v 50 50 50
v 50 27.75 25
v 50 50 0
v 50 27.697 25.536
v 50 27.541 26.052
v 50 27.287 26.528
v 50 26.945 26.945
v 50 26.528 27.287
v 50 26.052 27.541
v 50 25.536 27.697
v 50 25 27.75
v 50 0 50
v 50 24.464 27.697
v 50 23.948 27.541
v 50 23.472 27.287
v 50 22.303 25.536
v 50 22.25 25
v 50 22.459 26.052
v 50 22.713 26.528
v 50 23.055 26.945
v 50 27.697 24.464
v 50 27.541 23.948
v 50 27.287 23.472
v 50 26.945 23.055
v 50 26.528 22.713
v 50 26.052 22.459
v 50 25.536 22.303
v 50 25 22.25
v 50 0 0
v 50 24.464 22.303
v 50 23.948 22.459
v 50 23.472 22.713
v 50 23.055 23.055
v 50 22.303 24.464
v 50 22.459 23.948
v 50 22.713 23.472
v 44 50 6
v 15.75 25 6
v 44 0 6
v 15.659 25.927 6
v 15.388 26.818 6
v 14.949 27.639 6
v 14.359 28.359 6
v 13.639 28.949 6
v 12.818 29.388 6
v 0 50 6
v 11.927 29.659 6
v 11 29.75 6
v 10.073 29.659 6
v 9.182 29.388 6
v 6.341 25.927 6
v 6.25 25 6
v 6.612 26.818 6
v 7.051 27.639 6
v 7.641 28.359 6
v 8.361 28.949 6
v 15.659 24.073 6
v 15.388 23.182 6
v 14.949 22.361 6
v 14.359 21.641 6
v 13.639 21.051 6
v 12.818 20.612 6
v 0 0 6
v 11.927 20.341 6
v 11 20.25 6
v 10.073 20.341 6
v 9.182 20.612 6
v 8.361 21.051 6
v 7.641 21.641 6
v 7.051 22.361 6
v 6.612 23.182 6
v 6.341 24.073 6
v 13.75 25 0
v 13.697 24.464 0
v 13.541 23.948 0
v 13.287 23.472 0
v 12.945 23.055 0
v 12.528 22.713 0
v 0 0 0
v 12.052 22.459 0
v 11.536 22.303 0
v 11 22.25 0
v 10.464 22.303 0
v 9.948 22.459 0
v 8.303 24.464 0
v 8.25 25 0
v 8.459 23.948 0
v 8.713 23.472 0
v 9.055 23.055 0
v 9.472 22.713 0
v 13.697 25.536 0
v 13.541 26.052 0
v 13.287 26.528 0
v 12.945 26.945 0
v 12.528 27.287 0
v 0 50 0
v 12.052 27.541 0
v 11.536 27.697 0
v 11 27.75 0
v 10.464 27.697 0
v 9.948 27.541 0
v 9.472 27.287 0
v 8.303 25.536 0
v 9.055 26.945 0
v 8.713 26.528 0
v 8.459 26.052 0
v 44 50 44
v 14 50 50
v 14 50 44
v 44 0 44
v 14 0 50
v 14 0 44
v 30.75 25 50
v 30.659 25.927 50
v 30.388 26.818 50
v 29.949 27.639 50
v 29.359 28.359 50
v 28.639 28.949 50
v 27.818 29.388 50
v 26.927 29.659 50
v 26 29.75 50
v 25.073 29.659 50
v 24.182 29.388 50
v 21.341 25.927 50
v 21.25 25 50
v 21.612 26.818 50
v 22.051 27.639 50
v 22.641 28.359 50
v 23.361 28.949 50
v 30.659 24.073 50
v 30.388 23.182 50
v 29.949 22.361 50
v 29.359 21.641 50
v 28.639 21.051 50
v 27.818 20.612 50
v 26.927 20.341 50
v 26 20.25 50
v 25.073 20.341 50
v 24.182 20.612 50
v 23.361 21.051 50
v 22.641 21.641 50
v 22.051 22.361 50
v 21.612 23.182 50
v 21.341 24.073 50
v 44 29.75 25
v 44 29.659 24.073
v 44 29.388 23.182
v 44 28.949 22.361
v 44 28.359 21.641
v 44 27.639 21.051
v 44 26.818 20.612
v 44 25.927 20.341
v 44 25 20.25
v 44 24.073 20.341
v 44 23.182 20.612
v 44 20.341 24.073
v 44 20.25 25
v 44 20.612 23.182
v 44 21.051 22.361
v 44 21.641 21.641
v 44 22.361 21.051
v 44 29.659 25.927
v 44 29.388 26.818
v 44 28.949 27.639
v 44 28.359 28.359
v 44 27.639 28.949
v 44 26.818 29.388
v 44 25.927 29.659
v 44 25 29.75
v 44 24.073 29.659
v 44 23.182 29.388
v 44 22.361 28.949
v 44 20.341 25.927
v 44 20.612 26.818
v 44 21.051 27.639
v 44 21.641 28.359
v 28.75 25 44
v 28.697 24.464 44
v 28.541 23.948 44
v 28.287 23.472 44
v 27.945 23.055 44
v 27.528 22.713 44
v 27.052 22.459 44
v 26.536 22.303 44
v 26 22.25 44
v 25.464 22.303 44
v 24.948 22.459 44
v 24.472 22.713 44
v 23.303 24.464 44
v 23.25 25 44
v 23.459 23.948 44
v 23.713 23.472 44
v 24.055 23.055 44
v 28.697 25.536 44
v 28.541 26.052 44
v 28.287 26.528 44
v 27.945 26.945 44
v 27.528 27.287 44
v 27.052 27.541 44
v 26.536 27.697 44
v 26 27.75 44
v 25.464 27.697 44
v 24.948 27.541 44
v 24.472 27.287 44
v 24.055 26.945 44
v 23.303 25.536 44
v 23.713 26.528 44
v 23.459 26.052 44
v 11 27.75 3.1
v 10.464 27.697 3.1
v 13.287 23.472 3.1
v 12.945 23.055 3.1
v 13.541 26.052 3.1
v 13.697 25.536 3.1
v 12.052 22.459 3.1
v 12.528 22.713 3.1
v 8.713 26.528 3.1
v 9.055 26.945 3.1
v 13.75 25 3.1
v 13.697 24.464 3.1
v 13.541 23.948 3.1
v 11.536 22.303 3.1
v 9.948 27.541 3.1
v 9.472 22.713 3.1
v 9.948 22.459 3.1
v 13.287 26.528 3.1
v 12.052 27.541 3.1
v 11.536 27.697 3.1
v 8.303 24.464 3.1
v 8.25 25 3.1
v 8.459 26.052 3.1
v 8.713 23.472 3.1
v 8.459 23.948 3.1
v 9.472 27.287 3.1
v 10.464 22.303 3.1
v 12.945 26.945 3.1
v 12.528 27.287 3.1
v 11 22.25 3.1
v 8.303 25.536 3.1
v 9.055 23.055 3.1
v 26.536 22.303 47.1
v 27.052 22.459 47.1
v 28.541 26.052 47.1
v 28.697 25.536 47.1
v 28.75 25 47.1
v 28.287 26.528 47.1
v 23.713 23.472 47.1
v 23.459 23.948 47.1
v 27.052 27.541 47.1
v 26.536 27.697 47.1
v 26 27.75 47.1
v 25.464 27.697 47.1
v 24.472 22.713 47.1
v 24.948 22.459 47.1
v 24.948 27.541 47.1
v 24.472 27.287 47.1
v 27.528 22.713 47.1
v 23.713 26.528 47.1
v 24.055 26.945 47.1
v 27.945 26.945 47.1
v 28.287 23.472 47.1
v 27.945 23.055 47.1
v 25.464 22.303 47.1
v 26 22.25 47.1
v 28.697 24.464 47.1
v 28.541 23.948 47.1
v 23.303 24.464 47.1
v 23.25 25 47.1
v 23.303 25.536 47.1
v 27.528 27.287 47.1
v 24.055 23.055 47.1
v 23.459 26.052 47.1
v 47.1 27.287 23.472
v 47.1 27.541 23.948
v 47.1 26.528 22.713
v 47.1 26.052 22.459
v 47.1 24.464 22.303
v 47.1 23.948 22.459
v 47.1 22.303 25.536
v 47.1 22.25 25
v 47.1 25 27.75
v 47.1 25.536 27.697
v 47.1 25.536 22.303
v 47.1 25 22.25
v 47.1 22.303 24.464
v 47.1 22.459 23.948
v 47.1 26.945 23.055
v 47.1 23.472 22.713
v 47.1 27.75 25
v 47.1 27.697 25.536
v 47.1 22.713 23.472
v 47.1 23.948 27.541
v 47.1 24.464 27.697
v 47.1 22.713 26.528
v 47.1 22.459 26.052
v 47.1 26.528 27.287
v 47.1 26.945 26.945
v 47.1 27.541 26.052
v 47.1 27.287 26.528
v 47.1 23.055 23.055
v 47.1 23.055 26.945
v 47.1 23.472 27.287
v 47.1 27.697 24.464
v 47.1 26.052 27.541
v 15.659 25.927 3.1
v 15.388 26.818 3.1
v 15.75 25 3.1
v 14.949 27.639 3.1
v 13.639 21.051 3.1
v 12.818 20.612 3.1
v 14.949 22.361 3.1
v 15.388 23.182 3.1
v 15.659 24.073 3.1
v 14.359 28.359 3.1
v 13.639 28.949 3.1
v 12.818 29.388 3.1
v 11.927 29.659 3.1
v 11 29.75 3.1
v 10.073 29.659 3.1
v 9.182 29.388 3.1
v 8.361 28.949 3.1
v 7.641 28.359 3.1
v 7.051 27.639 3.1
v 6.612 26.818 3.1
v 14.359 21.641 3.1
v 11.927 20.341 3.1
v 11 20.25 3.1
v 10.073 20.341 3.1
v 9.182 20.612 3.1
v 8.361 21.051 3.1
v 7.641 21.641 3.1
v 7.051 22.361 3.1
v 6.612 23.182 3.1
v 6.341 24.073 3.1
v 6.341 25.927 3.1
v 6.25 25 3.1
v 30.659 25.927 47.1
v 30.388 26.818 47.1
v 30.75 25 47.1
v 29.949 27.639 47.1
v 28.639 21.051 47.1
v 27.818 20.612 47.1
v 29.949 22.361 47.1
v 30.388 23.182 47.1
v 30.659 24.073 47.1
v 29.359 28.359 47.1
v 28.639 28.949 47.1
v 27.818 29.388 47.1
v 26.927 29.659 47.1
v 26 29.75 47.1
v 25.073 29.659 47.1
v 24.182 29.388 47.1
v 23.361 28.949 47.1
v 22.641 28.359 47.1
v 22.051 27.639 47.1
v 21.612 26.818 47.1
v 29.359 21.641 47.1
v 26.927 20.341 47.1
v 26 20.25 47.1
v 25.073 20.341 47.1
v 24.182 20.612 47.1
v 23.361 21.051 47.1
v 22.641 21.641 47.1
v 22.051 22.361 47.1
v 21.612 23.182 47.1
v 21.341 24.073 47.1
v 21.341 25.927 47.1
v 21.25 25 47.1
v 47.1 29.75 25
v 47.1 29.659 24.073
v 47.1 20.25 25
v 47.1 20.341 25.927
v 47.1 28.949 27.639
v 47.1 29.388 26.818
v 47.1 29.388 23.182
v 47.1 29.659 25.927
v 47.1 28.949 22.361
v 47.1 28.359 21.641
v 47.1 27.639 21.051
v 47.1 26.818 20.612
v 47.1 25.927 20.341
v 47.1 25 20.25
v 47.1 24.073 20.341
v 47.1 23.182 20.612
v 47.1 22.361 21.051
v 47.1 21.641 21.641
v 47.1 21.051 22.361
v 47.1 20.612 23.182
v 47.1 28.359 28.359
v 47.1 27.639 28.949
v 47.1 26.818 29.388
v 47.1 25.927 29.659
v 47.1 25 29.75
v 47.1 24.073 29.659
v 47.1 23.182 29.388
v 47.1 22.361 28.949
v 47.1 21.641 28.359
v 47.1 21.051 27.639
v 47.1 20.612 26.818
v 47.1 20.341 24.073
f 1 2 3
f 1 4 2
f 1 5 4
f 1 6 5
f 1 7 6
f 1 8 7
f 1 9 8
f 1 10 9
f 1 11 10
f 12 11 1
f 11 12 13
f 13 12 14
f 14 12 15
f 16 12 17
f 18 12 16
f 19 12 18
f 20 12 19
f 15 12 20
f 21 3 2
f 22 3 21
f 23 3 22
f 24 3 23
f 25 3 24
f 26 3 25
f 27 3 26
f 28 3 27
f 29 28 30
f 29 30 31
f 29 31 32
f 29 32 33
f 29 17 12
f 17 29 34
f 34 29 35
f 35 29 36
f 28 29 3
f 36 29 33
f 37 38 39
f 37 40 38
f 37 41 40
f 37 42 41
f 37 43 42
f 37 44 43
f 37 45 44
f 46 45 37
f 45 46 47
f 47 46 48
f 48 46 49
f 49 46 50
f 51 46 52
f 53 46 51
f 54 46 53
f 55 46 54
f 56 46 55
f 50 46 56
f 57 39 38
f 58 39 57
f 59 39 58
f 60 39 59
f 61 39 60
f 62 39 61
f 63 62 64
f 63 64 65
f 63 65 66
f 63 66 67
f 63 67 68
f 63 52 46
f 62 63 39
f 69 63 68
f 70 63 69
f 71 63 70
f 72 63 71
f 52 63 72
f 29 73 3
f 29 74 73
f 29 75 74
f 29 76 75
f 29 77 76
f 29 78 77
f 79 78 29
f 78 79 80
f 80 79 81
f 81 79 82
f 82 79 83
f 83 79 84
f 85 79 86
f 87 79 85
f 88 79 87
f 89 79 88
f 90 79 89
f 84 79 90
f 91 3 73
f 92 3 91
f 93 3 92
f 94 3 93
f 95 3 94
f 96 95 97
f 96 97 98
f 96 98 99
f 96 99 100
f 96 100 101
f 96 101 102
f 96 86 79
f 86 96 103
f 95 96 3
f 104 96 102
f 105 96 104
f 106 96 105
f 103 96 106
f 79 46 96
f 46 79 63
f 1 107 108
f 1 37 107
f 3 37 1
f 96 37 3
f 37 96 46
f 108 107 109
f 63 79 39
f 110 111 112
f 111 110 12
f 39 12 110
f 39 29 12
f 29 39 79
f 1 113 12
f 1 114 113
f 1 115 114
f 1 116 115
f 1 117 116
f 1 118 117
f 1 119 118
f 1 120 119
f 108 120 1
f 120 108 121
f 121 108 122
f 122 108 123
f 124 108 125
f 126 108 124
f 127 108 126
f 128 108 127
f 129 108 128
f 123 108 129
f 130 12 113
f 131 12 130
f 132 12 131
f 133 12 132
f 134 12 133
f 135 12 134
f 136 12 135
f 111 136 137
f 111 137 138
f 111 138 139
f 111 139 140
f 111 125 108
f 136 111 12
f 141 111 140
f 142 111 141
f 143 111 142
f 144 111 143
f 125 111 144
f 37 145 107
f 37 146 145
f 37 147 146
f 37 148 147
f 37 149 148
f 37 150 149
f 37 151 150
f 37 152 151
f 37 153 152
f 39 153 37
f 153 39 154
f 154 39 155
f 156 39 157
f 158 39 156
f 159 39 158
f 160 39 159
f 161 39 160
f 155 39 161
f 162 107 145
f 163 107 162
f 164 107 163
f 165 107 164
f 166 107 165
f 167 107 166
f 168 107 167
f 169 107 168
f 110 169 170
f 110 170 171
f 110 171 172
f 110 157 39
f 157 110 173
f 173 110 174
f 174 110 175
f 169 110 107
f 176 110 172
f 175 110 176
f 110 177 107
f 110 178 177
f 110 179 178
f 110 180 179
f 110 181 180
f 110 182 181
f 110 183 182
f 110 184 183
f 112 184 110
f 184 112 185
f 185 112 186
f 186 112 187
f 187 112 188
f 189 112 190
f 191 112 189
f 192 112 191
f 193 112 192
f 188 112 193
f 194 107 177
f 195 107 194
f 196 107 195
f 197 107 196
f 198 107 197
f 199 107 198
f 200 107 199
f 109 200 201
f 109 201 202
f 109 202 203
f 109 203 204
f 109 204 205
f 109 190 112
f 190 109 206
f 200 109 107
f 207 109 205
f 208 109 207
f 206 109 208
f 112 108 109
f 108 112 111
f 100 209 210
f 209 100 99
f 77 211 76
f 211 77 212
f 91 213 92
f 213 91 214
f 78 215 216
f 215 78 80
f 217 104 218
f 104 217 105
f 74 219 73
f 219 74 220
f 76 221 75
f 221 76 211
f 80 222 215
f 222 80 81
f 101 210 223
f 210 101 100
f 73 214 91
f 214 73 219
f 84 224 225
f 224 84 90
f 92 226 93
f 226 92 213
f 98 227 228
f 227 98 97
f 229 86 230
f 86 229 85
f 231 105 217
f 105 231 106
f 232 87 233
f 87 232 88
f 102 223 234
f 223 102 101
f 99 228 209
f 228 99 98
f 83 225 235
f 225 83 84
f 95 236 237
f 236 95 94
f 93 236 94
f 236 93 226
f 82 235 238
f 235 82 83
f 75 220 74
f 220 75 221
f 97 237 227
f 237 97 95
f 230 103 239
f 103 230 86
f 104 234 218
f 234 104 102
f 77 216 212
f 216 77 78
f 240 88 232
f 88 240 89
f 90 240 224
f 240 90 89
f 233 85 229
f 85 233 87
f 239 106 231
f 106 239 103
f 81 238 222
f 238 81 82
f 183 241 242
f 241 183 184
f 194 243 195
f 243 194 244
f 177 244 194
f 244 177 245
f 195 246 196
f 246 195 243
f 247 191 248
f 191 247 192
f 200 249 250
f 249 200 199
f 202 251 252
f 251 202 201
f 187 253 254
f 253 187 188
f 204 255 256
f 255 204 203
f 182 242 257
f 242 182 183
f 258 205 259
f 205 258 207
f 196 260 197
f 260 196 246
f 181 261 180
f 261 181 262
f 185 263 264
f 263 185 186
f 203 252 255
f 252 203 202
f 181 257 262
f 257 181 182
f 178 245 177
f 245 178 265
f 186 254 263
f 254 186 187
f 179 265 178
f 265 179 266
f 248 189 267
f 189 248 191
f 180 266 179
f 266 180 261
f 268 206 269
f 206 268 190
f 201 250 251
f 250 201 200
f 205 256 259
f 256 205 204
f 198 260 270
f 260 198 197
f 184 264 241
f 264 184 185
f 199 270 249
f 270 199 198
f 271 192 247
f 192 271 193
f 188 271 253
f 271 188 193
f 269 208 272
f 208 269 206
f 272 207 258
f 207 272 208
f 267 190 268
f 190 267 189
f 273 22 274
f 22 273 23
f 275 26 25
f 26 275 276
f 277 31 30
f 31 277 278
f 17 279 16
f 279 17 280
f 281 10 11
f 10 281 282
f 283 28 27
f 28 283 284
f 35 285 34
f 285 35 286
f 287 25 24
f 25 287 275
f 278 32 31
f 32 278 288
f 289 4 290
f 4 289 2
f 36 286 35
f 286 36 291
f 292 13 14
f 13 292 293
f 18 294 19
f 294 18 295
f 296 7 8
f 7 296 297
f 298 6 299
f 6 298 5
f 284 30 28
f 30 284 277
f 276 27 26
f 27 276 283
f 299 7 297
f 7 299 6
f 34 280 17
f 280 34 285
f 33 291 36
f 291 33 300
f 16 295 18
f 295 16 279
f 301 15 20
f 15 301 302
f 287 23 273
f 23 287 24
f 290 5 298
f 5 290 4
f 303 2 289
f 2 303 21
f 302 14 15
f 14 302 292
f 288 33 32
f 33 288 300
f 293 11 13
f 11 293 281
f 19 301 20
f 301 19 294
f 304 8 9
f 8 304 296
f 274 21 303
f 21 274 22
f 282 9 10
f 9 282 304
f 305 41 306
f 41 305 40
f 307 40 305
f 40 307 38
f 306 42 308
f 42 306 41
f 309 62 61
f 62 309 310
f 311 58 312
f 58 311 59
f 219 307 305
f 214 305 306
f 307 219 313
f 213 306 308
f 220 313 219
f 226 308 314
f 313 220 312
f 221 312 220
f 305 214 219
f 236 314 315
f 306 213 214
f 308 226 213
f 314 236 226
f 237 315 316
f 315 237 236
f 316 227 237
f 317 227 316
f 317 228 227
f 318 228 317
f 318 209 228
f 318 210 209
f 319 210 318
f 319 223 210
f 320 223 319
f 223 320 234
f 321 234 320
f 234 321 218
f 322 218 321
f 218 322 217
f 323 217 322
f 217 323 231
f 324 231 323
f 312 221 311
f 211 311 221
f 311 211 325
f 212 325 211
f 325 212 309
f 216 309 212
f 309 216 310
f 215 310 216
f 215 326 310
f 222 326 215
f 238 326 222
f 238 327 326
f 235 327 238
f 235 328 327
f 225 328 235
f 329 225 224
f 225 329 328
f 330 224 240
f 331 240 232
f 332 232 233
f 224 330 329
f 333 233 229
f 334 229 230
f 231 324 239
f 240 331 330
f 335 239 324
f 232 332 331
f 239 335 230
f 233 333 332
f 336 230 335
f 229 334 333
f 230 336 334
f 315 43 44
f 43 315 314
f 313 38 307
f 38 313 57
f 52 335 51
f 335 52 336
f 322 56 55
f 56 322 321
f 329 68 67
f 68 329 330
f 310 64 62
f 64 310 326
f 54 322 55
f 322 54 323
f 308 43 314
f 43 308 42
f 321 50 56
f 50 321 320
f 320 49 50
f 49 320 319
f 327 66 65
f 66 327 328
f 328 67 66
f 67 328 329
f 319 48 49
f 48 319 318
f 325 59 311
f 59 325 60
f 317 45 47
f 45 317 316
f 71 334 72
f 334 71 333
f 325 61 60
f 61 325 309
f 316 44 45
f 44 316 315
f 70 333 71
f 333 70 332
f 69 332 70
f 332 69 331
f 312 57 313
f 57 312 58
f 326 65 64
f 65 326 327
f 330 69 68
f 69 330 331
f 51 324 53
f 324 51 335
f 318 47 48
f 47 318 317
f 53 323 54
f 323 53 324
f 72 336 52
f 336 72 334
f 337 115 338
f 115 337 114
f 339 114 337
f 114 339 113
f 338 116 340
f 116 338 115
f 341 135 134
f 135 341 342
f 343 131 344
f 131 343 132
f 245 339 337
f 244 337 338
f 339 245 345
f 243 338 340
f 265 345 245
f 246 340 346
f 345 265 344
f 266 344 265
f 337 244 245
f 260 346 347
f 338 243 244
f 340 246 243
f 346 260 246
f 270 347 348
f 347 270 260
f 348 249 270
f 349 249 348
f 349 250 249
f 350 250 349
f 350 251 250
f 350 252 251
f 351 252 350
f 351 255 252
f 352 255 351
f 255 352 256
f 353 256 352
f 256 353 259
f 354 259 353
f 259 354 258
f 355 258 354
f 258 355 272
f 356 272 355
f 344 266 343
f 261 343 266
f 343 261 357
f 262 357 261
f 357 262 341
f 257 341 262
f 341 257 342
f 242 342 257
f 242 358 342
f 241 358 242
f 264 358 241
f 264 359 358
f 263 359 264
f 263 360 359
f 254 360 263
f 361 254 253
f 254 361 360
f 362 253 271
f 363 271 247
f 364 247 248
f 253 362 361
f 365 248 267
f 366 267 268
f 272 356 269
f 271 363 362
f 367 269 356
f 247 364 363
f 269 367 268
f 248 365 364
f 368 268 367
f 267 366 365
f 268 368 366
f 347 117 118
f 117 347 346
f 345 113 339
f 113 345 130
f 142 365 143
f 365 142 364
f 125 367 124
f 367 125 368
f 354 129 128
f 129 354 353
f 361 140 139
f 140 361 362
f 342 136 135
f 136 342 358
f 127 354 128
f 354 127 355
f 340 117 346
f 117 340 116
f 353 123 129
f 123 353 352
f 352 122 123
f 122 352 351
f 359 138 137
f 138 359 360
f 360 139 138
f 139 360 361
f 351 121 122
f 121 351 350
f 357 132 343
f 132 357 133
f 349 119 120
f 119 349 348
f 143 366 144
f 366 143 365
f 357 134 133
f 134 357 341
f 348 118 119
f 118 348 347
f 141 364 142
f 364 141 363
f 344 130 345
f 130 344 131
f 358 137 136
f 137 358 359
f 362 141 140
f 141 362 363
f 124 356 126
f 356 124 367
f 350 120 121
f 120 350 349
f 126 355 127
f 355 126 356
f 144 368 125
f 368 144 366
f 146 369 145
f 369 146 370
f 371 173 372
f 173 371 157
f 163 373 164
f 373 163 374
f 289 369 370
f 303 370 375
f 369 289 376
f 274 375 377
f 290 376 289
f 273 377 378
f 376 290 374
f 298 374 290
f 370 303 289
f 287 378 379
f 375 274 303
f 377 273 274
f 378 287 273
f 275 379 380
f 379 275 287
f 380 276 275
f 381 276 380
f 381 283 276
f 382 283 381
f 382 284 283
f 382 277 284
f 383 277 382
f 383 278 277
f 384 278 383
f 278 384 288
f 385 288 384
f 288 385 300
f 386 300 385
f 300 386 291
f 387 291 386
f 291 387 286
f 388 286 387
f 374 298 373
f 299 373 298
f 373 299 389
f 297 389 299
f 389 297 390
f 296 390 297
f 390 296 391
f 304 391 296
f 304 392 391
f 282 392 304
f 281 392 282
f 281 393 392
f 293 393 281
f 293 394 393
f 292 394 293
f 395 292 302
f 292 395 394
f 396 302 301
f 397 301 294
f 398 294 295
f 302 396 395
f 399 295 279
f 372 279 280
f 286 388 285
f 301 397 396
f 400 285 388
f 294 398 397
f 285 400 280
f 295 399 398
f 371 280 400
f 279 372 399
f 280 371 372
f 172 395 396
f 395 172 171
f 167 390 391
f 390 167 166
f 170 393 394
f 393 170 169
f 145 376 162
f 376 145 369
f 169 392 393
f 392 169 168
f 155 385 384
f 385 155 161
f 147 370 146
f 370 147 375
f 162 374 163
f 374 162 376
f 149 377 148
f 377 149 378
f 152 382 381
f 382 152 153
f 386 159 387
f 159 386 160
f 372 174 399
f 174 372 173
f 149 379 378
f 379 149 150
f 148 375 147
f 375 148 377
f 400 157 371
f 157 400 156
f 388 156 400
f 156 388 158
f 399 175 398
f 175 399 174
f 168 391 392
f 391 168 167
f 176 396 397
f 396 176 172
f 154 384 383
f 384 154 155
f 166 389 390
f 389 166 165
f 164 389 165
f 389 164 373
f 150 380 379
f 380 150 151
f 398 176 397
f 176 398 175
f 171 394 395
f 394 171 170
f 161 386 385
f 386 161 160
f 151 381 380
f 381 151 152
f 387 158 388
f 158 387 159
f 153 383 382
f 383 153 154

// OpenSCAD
$fn = 32;

// ----------------------------------------------------------------------
// Z-bracket: 50 x 50 x 50 mm
// ----------------------------------------------------------------------

// --- parameters (mm) ---
bottom_run = 50;          // lower foot length, X
top_run = 30;             // upper foot length, X
profile_w = 50;           // bracket width, Y
height = 50;              // overall rise, Z
mat_t = 6;                // plate thickness
hole_d = 5.5;             // clearance for M5
cb_d = 9.5;               // counterbore diameter
cb_h = 2.9;               // counterbore depth

module hole_z(px, py, z0) {
  translate([px, py, z0 - 2.5]) cylinder(h = mat_t + 5, d = hole_d);
}
module hole_x(py, pz) {
  translate([-2.5, py, pz]) rotate([0, 90, 0]) cylinder(h = mat_t + 5, d = hole_d);
}
module cb_z(px, py, top_z) {
  translate([px, py, top_z - cb_h]) cylinder(h = cb_h + 0.5, d = cb_d);
}
module cb_x(py, pz) {
  translate([mat_t - cb_h, py, pz]) rotate([0, -90, 0]) cylinder(h = cb_h + 0.5, d = cb_d);
}

difference() {
  union() {
    cube([bottom_run, profile_w, mat_t]);
    /* web, overlapping the lower foot */
    translate([bottom_run - mat_t, 0, 0]) cube([mat_t, profile_w, height]);
    /* upper foot, sunk into the web */
    translate([bottom_run - mat_t - top_run, 0, height - mat_t]) cube([top_run + mat_t, profile_w, mat_t]);
  }
  hole_z(11, 25, 0);
  translate([bottom_run - mat_t - 18, 0, 0]) hole_z(0, 25, height - mat_t);
  translate([bottom_run - mat_t, 0, 0]) hole_x(25, 25);
  cb_z(11, 25, mat_t);
  translate([bottom_run - mat_t - 18, 0, 0]) cb_z(0, 25, height);
  translate([bottom_run - mat_t, 0, 0]) cb_x(25, 25);
}
